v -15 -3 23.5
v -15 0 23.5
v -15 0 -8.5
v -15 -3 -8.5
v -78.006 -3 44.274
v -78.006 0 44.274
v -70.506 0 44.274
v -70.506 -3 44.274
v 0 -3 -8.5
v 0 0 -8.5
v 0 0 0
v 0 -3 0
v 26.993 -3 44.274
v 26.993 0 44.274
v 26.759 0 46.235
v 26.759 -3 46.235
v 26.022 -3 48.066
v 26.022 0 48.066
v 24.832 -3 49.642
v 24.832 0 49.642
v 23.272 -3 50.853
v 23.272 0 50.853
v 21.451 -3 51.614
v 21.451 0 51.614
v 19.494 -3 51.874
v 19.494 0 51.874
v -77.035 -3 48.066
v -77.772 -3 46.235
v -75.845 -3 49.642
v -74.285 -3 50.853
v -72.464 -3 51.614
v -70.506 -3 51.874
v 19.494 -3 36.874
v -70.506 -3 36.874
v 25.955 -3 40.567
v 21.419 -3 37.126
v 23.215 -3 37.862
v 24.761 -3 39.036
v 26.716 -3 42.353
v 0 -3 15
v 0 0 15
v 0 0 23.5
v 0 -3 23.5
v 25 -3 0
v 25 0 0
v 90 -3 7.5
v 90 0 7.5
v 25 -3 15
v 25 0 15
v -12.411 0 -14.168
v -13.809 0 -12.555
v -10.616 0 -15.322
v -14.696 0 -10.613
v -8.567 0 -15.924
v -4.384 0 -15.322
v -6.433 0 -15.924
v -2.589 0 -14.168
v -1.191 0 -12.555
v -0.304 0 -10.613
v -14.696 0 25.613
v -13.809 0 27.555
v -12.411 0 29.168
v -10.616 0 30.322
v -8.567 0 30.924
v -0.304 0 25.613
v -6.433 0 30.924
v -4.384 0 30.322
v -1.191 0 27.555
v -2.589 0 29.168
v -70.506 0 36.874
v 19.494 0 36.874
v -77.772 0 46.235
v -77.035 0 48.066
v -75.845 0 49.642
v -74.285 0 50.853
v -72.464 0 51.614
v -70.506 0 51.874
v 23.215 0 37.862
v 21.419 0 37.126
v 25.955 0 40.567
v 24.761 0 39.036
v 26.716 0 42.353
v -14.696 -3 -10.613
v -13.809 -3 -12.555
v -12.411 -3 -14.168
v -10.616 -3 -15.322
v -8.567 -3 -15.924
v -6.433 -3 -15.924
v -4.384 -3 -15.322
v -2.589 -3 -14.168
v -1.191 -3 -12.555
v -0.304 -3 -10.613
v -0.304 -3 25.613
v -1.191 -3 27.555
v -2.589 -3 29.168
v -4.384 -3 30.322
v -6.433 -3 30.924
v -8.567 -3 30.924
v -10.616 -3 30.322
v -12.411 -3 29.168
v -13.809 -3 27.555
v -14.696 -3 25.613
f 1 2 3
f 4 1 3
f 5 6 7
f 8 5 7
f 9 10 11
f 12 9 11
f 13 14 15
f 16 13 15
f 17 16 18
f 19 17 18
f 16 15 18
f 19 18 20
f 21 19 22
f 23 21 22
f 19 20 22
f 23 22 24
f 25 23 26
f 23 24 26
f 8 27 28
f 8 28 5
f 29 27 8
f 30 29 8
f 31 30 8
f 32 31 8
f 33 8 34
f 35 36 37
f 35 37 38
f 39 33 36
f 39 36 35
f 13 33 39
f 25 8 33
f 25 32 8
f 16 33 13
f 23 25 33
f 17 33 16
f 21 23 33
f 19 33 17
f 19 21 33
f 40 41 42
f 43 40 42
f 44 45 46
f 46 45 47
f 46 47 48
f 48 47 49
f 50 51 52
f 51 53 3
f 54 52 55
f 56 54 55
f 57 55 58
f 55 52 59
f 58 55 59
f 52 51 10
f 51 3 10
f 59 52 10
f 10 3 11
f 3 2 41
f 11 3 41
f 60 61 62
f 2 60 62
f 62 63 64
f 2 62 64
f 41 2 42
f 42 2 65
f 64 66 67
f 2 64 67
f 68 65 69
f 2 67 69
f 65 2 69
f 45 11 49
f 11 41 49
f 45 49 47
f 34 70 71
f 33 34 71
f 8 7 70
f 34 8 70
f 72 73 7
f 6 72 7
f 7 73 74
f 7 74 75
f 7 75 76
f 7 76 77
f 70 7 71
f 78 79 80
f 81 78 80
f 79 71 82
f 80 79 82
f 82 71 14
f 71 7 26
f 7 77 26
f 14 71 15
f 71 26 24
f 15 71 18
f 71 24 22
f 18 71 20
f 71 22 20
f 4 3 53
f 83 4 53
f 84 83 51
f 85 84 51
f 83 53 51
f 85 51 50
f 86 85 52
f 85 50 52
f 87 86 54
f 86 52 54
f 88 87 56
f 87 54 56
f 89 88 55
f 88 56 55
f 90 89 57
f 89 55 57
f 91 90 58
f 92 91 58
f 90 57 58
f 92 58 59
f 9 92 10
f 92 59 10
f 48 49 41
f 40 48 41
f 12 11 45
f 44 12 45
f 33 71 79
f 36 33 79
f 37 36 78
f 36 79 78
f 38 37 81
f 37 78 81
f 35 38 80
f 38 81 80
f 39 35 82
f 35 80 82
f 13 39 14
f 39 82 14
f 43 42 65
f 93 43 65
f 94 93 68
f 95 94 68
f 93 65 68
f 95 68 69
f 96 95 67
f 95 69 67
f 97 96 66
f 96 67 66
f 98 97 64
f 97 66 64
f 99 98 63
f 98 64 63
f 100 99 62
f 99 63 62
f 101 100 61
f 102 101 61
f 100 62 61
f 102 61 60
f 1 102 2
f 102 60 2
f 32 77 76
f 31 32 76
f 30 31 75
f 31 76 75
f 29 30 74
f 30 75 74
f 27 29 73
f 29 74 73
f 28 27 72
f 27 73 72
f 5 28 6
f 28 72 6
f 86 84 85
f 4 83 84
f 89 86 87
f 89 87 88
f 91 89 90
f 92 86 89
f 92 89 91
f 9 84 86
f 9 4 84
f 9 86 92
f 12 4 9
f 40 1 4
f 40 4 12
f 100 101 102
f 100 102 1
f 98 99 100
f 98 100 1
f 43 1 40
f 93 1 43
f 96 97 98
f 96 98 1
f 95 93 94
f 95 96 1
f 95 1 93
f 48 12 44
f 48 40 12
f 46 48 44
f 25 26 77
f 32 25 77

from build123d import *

# Parameters (mm, degrees)
F0_W     = 15
F0_H     = 15
F0_R     = 1.5
F1_DEPTH = 3


# Not quite as in the source:
# - a feature names something its author has since deleted; it is built from what else it names


with BuildPart() as f1:
    # F0 (on Front) → F1 (new body)
    with BuildSketch(Plane.XZ):
        with Locations((-7.5, 7.5)):
            Rectangle(F0_W, F0_H)
        with BuildLine():
            Line((-15, 15), (0, 15))
            Line((0, 15), (0, 23.5))
            ThreePointArc((0, 23.5), (-7.5, 31), (-15, 23.5))
            Line((-15, 23.5), (-15, 15))
        make_face()
        with Locations((-7.5, 23.5)):
            Circle(F0_R, mode=Mode.SUBTRACT)
        with Locations((-7.5, 23.5)):
            Circle(F0_R)
        with BuildLine():
            Line((0, -8.5), (0, 0))
            Line((0, 0), (-15, 0))
            Line((-15, 0), (-15, -8.5))
            ThreePointArc((-15, -8.5), (-7.5, -16), (0, -8.5))
        make_face()
        with Locations((-7.5, -8.5)):
            Circle(F0_R, mode=Mode.SUBTRACT)
        Polygon((0, 15), (0, 0), (25, 0), (90, 7.5), (25, 15), align=None)
        with Locations((-7.5, -8.5)):
            Circle(F0_R)
    extrude(amount=F1_DEPTH)


with BuildPart() as f1b:
    # F0 (on Front) → F1, piece 2 (new body)
    with BuildSketch(Plane.XZ):
        with BuildLine():
            Line((-70.5063530058, 44.2742461503), (-70.5063530058, 36.8742461503))
            Line((-70.5063530058, 36.8742461503), (19.4936469942, 36.8742461503))
            Line((19.4936469942, 36.8742461503), (19.4936469942, 42.8742461503))
            ThreePointArc((19.4936469942, 42.8742461503), (18.4689519176, 43.2788010352), (17.9969840395, 44.2742461503))
            Line((17.9969840395, 44.2742461503), (-59.8173476756, 44.2742461503))
            Line((-59.8173476756, 44.2742461503), (-70.5063530058, 44.2742461503))
        make_face()
        with BuildLine():
            Line((-70.5063530058, 51.8742461503), (-70.5063530058, 44.2742461503))
            Line((-70.5063530058, 44.2742461503), (-59.8173476756, 44.2742461503))
            Line((-59.8173476756, 44.2742461503), (17.9969840395, 44.2742461503))
            ThreePointArc((17.9969840395, 44.2742461503), (18.3982018792, 45.3989412269), (19.4936469942, 45.8742461503))
            Line((19.4936469942, 45.8742461503), (19.4936469942, 51.8742461503))
            Line((19.4936469942, 51.8742461503), (-70.5063530058, 51.8742461503))
        make_face()
        with BuildLine():
            Line((19.4936469942, 42.8742461503), (19.4936469942, 36.8742461503))
            ThreePointArc((19.4936469942, 36.8742461503), (24.7614738707, 39.0357070242), (26.9929802979, 44.2742461503))
            Line((26.9929802979, 44.2742461503), (20.9903099489, 44.2742461503))
            ThreePointArc((20.9903099489, 44.2742461503), (20.5183420708, 43.2788010352), (19.4936469942, 42.8742461503))
        make_face()
        with BuildLine():
            Line((20.9903099489, 44.2742461503), (26.9929802979, 44.2742461503))
            ThreePointArc((26.9929802979, 44.2742461503), (24.8321861202, 49.6420730267), (19.4936469942, 51.8742461503))
            Line((19.4936469942, 51.8742461503), (19.4936469942, 45.8742461503))
            ThreePointArc((19.4936469942, 45.8742461503), (20.554307166, 45.434906322), (20.9936469942, 44.3742461503))
            ThreePointArc((20.9936469942, 44.3742461503), (20.9928125008, 44.3242183183), (20.9903099489, 44.2742461503))
        make_face()
        with BuildLine():
            Line((19.4936469942, 45.8742461503), (19.4936469942, 44.2742461503))
            Line((19.4936469942, 44.2742461503), (20.9903099489, 44.2742461503))
            ThreePointArc((20.9903099489, 44.2742461503), (20.9928125008, 44.3242183183), (20.9936469942, 44.3742461503))
            ThreePointArc((20.9936469942, 44.3742461503), (20.554307166, 45.434906322), (19.4936469942, 45.8742461503))
        make_face()
        with BuildLine():
            Line((17.9969840395, 44.2742461503), (19.4936469942, 44.2742461503))
            Line((19.4936469942, 44.2742461503), (19.4936469942, 45.8742461503))
            ThreePointArc((19.4936469942, 45.8742461503), (18.3982018792, 45.3989412269), (17.9969840395, 44.2742461503))
        make_face()
        with BuildLine():
            Line((19.4936469942, 44.2742461503), (19.4936469942, 42.8742461503))
            ThreePointArc((19.4936469942, 42.8742461503), (20.5183420708, 43.2788010352), (20.9903099489, 44.2742461503))
            Line((20.9903099489, 44.2742461503), (19.4936469942, 44.2742461503))
        make_face()
        with BuildLine():
            ThreePointArc((17.9969840395, 44.2742461503), (18.4689519176, 43.2788010352), (19.4936469942, 42.8742461503))
            Line((19.4936469942, 42.8742461503), (19.4936469942, 44.2742461503))
            Line((19.4936469942, 44.2742461503), (17.9969840395, 44.2742461503))
        make_face()
        with BuildLine():
            Line((-78.0056863095, 44.2742461503), (-70.5063530058, 44.2742461503))
            Line((-70.5063530058, 44.2742461503), (-70.5063530058, 51.8742461503))
            ThreePointArc((-70.5063530058, 51.8742461503), (-75.8448921318, 49.6420730267), (-78.0056863095, 44.2742461503))
        make_face()
    extrude(amount=F1_DEPTH)


solid = Compound([f1.part, f1b.part])
